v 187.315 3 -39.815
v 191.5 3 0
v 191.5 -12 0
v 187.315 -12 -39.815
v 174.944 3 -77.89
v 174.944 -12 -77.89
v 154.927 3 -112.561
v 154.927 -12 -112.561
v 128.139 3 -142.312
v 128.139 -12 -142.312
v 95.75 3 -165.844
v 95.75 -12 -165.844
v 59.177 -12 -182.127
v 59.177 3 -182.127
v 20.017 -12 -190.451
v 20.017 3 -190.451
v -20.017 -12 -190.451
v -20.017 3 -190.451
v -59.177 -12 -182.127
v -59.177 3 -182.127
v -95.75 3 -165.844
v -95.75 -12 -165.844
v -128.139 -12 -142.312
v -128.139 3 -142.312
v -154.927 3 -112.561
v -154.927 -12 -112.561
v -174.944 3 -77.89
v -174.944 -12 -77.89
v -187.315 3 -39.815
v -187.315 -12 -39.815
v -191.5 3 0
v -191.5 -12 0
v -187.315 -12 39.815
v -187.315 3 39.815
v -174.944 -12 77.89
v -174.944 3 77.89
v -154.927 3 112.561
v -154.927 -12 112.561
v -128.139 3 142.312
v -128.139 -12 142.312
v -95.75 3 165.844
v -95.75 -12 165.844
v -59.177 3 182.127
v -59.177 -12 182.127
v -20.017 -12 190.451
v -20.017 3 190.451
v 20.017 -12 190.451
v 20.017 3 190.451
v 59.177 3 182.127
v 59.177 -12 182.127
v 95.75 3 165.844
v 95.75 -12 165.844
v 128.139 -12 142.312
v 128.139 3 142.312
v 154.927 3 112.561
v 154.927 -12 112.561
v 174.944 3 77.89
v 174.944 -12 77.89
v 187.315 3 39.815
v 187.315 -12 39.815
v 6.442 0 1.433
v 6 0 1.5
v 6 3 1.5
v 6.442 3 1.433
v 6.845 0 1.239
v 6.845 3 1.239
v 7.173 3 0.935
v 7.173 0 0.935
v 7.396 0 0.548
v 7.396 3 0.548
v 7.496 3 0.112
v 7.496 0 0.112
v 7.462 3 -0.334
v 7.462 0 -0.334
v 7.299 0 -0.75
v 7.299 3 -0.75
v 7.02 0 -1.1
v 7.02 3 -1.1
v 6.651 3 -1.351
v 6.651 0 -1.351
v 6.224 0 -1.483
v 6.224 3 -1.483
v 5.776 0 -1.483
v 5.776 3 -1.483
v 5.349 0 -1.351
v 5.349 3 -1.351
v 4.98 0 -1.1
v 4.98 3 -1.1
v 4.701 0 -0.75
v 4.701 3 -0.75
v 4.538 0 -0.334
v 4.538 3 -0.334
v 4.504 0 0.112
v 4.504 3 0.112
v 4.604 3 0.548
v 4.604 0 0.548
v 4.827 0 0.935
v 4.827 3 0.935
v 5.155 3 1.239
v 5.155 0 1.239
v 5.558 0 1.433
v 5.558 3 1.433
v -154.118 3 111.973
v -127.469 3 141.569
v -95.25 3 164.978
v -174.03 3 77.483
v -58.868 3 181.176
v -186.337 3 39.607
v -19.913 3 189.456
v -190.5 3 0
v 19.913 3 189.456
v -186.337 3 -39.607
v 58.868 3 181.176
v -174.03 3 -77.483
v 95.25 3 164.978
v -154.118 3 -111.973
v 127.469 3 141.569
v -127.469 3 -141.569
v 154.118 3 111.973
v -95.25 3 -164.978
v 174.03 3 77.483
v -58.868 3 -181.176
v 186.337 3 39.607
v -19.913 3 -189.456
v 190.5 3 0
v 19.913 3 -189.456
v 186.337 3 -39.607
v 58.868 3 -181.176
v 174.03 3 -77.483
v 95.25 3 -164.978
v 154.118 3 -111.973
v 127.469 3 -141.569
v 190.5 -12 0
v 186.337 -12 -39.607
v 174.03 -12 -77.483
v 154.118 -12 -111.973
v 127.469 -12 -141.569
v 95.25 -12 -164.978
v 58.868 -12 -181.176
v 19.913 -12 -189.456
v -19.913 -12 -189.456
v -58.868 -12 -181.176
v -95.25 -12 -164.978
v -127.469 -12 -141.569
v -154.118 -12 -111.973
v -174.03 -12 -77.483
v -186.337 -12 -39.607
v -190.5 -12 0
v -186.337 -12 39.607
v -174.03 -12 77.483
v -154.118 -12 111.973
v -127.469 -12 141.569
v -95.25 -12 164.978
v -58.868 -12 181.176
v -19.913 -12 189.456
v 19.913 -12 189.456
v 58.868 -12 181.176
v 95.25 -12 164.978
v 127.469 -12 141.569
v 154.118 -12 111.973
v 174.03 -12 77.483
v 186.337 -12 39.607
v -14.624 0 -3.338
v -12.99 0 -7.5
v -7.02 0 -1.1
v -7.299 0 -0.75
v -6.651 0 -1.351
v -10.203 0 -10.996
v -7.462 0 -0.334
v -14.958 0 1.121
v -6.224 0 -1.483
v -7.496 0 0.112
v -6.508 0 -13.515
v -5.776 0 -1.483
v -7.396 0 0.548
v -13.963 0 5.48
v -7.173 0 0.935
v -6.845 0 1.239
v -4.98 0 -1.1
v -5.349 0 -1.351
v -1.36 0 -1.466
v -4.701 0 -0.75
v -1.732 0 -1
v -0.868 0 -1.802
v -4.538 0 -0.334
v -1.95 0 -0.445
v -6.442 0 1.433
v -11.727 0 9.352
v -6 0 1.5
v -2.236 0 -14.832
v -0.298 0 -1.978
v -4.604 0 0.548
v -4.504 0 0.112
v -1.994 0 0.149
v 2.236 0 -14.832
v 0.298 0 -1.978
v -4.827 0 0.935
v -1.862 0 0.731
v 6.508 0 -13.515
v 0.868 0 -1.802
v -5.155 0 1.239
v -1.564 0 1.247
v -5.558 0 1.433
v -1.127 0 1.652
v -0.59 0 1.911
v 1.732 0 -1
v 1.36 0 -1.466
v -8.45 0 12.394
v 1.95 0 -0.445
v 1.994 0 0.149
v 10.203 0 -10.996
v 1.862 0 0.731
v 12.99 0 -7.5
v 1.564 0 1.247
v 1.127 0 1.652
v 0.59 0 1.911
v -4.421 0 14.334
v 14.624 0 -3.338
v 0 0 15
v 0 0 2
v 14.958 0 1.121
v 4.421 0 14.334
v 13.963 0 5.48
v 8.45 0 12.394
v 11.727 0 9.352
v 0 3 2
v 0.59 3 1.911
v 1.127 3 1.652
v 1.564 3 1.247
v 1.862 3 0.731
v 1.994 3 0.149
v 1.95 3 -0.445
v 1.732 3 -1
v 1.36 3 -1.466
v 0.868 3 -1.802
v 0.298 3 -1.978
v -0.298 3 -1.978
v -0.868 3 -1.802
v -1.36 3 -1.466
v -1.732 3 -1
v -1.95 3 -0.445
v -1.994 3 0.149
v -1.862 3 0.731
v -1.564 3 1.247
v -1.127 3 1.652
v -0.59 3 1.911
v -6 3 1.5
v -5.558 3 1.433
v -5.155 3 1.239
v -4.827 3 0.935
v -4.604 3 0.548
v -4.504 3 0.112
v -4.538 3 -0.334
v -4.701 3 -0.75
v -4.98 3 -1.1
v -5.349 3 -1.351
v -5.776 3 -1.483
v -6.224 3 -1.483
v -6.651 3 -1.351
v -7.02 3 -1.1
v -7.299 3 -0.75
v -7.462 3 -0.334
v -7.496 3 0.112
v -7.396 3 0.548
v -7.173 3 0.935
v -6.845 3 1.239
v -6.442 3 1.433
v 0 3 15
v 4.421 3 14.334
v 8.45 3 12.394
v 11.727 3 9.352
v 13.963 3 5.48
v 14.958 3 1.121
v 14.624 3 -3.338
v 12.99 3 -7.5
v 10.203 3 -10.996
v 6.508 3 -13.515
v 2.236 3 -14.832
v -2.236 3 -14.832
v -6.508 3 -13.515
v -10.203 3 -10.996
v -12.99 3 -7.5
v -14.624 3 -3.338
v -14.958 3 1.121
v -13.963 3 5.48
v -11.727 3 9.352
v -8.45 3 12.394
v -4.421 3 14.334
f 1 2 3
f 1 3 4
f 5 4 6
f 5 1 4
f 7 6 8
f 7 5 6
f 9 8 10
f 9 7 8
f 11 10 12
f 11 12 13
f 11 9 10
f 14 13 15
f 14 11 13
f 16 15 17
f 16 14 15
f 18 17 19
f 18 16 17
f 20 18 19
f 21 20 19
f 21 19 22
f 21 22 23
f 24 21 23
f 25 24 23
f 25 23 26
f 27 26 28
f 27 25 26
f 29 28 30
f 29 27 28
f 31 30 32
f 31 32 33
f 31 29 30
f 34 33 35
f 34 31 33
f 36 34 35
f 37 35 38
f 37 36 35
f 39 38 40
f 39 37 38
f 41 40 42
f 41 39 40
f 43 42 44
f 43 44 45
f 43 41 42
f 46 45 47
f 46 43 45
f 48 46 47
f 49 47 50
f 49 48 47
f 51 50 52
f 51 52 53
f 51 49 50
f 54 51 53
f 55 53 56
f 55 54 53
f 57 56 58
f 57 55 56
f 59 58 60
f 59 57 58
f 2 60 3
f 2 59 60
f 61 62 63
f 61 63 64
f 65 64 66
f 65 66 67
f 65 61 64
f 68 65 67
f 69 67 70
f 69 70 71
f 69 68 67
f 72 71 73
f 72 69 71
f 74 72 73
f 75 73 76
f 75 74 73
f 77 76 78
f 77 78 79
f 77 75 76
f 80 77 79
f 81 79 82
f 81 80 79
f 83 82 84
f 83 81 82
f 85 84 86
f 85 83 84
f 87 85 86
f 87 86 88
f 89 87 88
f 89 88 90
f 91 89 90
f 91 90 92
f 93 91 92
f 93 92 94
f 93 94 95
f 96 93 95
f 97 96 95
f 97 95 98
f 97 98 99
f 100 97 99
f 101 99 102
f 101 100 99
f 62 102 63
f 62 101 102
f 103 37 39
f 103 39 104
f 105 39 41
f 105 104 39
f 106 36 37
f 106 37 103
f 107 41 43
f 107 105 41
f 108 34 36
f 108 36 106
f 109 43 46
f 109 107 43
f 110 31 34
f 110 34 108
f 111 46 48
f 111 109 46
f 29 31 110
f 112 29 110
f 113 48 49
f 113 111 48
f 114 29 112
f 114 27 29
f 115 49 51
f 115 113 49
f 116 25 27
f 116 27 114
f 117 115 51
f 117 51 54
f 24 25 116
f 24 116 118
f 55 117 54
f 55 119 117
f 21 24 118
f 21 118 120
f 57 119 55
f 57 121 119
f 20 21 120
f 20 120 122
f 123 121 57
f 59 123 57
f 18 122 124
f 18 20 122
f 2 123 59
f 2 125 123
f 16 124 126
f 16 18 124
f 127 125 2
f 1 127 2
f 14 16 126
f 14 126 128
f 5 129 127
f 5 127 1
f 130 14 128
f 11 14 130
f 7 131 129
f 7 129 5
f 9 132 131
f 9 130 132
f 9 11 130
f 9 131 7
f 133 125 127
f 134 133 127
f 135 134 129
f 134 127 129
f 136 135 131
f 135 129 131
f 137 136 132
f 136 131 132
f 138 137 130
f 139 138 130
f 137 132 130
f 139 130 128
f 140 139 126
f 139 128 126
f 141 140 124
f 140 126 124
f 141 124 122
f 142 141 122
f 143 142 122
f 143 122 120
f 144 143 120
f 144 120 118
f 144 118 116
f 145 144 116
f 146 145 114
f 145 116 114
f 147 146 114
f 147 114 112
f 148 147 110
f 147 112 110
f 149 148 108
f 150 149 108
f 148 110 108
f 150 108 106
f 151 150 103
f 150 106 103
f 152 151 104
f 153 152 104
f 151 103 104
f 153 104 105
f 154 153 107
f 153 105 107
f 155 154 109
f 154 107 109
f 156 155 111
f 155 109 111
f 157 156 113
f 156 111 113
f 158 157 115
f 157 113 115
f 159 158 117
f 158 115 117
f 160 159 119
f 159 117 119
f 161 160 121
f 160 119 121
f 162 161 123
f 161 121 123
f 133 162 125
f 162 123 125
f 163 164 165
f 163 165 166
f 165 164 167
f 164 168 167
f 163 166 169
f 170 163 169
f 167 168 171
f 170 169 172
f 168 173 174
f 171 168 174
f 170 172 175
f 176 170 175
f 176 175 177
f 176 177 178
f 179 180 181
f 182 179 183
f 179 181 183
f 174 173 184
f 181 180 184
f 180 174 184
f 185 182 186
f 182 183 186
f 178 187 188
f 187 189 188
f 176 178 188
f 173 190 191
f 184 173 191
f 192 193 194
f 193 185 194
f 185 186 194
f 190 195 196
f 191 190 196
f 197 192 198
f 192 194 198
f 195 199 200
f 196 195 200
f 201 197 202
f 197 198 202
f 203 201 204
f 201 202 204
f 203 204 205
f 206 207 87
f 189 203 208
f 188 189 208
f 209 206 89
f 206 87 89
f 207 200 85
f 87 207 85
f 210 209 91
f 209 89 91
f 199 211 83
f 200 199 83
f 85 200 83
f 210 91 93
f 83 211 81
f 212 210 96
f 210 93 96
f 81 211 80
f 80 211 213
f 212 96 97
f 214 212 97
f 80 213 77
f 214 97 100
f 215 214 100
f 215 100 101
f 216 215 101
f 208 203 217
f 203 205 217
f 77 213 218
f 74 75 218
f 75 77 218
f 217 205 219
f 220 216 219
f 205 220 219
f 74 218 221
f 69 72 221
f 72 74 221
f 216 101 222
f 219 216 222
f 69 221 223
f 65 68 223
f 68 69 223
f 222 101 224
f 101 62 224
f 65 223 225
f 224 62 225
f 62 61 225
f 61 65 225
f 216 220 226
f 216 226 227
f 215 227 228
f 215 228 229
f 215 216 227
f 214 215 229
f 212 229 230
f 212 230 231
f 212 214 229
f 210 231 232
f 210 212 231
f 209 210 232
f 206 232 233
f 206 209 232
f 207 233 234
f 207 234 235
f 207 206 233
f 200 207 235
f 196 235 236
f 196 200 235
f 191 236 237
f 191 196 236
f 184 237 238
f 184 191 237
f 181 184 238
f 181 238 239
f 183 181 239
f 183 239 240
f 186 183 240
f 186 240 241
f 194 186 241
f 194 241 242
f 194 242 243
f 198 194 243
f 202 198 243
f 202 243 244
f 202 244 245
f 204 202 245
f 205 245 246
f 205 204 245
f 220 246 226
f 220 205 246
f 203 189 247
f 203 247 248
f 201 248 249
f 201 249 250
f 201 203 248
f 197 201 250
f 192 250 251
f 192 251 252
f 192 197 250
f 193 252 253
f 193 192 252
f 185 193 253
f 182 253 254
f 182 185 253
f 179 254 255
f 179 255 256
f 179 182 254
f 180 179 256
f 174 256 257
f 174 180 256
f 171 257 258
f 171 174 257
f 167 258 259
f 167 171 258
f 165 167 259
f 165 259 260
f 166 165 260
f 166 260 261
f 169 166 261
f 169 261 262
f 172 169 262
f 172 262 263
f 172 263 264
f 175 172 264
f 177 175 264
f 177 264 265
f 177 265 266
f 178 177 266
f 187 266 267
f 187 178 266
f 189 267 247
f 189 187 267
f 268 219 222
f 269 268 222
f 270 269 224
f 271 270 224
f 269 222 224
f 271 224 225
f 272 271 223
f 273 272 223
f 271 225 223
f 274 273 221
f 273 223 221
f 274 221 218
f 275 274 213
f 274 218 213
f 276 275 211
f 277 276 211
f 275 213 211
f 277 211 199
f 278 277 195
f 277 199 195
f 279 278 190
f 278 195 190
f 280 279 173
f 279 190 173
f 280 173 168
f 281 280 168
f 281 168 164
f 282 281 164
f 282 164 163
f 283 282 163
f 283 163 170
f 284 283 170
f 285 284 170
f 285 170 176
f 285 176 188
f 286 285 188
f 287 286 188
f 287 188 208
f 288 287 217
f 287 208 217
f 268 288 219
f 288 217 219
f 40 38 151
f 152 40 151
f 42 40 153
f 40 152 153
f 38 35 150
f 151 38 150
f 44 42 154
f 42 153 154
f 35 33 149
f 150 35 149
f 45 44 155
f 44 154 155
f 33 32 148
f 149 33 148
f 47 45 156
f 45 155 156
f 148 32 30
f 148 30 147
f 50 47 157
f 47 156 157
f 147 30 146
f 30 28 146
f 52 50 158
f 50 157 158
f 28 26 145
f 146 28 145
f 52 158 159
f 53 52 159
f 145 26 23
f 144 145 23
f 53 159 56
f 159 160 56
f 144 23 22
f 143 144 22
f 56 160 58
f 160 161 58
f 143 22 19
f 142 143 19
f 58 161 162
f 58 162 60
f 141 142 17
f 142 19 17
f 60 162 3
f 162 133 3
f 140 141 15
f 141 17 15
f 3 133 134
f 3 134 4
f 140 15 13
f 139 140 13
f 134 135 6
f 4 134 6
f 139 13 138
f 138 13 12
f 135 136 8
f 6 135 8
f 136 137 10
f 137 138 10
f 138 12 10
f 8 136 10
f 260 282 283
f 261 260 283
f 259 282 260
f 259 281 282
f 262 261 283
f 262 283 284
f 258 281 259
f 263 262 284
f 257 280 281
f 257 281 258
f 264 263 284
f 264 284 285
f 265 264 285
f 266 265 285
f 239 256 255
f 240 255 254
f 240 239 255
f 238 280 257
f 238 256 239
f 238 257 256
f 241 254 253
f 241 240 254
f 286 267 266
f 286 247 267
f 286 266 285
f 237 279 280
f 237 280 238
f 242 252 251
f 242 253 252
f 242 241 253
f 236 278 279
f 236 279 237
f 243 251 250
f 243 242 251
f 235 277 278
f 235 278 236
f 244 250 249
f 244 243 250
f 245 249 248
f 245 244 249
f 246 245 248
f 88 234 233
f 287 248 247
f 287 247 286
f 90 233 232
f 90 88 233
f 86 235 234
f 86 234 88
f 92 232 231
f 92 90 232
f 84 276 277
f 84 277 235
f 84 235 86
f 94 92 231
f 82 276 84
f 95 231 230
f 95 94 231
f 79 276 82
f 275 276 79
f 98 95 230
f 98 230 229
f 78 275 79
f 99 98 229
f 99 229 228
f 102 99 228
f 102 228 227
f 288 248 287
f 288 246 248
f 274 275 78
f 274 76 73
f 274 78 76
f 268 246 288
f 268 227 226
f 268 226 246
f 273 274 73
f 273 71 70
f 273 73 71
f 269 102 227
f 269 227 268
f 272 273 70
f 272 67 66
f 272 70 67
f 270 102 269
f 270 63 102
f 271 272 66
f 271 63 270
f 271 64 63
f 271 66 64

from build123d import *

# Parameters (mm, degrees)
SKETCH1_R           = 15
SKETCH1_R_2         = 1.5
SKETCH1_R_3         = 2
BOSS_EXTRUDE1_DEPTH = 3
SKETCH3_R           = 191.5
SKETCH3_R_2         = 190.5
EXTRUDE_THIN3_DEPTH = 15


with BuildPart() as part:
    # Sketch1 → Boss-Extrude1 (new body)
    with BuildSketch(Plane(origin=(0, 0, 0), x_dir=(1, 0, 0), z_dir=(0, 1, 0))):
        with Locations(Location((0, 0, 0), (0, 0, 270))):
            Circle(SKETCH1_R)
        with Locations(Location((-6, 0, 0), (0, 0, 270))):
            Circle(SKETCH1_R_2, mode=Mode.SUBTRACT)
        with Locations(Location((6, 0, 0), (0, 0, 270))):
            Circle(SKETCH1_R_2, mode=Mode.SUBTRACT)
        with Locations(Location((0, 0, 0), (0, 0, 270))):
            Circle(SKETCH1_R_3, mode=Mode.SUBTRACT)
    extrude(amount=BOSS_EXTRUDE1_DEPTH)


with BuildPart() as body_2:
    # Sketch3 → Extrude-Thin3 (new body)
    with BuildSketch(Plane(origin=(0, 3, 0), x_dir=(1, 0, 0), z_dir=(0, 1, 0))):
        Circle(SKETCH3_R)
        Circle(SKETCH3_R_2, mode=Mode.SUBTRACT)
    extrude(amount=-EXTRUDE_THIN3_DEPTH)


solid = Compound([part.part, body_2.part])
